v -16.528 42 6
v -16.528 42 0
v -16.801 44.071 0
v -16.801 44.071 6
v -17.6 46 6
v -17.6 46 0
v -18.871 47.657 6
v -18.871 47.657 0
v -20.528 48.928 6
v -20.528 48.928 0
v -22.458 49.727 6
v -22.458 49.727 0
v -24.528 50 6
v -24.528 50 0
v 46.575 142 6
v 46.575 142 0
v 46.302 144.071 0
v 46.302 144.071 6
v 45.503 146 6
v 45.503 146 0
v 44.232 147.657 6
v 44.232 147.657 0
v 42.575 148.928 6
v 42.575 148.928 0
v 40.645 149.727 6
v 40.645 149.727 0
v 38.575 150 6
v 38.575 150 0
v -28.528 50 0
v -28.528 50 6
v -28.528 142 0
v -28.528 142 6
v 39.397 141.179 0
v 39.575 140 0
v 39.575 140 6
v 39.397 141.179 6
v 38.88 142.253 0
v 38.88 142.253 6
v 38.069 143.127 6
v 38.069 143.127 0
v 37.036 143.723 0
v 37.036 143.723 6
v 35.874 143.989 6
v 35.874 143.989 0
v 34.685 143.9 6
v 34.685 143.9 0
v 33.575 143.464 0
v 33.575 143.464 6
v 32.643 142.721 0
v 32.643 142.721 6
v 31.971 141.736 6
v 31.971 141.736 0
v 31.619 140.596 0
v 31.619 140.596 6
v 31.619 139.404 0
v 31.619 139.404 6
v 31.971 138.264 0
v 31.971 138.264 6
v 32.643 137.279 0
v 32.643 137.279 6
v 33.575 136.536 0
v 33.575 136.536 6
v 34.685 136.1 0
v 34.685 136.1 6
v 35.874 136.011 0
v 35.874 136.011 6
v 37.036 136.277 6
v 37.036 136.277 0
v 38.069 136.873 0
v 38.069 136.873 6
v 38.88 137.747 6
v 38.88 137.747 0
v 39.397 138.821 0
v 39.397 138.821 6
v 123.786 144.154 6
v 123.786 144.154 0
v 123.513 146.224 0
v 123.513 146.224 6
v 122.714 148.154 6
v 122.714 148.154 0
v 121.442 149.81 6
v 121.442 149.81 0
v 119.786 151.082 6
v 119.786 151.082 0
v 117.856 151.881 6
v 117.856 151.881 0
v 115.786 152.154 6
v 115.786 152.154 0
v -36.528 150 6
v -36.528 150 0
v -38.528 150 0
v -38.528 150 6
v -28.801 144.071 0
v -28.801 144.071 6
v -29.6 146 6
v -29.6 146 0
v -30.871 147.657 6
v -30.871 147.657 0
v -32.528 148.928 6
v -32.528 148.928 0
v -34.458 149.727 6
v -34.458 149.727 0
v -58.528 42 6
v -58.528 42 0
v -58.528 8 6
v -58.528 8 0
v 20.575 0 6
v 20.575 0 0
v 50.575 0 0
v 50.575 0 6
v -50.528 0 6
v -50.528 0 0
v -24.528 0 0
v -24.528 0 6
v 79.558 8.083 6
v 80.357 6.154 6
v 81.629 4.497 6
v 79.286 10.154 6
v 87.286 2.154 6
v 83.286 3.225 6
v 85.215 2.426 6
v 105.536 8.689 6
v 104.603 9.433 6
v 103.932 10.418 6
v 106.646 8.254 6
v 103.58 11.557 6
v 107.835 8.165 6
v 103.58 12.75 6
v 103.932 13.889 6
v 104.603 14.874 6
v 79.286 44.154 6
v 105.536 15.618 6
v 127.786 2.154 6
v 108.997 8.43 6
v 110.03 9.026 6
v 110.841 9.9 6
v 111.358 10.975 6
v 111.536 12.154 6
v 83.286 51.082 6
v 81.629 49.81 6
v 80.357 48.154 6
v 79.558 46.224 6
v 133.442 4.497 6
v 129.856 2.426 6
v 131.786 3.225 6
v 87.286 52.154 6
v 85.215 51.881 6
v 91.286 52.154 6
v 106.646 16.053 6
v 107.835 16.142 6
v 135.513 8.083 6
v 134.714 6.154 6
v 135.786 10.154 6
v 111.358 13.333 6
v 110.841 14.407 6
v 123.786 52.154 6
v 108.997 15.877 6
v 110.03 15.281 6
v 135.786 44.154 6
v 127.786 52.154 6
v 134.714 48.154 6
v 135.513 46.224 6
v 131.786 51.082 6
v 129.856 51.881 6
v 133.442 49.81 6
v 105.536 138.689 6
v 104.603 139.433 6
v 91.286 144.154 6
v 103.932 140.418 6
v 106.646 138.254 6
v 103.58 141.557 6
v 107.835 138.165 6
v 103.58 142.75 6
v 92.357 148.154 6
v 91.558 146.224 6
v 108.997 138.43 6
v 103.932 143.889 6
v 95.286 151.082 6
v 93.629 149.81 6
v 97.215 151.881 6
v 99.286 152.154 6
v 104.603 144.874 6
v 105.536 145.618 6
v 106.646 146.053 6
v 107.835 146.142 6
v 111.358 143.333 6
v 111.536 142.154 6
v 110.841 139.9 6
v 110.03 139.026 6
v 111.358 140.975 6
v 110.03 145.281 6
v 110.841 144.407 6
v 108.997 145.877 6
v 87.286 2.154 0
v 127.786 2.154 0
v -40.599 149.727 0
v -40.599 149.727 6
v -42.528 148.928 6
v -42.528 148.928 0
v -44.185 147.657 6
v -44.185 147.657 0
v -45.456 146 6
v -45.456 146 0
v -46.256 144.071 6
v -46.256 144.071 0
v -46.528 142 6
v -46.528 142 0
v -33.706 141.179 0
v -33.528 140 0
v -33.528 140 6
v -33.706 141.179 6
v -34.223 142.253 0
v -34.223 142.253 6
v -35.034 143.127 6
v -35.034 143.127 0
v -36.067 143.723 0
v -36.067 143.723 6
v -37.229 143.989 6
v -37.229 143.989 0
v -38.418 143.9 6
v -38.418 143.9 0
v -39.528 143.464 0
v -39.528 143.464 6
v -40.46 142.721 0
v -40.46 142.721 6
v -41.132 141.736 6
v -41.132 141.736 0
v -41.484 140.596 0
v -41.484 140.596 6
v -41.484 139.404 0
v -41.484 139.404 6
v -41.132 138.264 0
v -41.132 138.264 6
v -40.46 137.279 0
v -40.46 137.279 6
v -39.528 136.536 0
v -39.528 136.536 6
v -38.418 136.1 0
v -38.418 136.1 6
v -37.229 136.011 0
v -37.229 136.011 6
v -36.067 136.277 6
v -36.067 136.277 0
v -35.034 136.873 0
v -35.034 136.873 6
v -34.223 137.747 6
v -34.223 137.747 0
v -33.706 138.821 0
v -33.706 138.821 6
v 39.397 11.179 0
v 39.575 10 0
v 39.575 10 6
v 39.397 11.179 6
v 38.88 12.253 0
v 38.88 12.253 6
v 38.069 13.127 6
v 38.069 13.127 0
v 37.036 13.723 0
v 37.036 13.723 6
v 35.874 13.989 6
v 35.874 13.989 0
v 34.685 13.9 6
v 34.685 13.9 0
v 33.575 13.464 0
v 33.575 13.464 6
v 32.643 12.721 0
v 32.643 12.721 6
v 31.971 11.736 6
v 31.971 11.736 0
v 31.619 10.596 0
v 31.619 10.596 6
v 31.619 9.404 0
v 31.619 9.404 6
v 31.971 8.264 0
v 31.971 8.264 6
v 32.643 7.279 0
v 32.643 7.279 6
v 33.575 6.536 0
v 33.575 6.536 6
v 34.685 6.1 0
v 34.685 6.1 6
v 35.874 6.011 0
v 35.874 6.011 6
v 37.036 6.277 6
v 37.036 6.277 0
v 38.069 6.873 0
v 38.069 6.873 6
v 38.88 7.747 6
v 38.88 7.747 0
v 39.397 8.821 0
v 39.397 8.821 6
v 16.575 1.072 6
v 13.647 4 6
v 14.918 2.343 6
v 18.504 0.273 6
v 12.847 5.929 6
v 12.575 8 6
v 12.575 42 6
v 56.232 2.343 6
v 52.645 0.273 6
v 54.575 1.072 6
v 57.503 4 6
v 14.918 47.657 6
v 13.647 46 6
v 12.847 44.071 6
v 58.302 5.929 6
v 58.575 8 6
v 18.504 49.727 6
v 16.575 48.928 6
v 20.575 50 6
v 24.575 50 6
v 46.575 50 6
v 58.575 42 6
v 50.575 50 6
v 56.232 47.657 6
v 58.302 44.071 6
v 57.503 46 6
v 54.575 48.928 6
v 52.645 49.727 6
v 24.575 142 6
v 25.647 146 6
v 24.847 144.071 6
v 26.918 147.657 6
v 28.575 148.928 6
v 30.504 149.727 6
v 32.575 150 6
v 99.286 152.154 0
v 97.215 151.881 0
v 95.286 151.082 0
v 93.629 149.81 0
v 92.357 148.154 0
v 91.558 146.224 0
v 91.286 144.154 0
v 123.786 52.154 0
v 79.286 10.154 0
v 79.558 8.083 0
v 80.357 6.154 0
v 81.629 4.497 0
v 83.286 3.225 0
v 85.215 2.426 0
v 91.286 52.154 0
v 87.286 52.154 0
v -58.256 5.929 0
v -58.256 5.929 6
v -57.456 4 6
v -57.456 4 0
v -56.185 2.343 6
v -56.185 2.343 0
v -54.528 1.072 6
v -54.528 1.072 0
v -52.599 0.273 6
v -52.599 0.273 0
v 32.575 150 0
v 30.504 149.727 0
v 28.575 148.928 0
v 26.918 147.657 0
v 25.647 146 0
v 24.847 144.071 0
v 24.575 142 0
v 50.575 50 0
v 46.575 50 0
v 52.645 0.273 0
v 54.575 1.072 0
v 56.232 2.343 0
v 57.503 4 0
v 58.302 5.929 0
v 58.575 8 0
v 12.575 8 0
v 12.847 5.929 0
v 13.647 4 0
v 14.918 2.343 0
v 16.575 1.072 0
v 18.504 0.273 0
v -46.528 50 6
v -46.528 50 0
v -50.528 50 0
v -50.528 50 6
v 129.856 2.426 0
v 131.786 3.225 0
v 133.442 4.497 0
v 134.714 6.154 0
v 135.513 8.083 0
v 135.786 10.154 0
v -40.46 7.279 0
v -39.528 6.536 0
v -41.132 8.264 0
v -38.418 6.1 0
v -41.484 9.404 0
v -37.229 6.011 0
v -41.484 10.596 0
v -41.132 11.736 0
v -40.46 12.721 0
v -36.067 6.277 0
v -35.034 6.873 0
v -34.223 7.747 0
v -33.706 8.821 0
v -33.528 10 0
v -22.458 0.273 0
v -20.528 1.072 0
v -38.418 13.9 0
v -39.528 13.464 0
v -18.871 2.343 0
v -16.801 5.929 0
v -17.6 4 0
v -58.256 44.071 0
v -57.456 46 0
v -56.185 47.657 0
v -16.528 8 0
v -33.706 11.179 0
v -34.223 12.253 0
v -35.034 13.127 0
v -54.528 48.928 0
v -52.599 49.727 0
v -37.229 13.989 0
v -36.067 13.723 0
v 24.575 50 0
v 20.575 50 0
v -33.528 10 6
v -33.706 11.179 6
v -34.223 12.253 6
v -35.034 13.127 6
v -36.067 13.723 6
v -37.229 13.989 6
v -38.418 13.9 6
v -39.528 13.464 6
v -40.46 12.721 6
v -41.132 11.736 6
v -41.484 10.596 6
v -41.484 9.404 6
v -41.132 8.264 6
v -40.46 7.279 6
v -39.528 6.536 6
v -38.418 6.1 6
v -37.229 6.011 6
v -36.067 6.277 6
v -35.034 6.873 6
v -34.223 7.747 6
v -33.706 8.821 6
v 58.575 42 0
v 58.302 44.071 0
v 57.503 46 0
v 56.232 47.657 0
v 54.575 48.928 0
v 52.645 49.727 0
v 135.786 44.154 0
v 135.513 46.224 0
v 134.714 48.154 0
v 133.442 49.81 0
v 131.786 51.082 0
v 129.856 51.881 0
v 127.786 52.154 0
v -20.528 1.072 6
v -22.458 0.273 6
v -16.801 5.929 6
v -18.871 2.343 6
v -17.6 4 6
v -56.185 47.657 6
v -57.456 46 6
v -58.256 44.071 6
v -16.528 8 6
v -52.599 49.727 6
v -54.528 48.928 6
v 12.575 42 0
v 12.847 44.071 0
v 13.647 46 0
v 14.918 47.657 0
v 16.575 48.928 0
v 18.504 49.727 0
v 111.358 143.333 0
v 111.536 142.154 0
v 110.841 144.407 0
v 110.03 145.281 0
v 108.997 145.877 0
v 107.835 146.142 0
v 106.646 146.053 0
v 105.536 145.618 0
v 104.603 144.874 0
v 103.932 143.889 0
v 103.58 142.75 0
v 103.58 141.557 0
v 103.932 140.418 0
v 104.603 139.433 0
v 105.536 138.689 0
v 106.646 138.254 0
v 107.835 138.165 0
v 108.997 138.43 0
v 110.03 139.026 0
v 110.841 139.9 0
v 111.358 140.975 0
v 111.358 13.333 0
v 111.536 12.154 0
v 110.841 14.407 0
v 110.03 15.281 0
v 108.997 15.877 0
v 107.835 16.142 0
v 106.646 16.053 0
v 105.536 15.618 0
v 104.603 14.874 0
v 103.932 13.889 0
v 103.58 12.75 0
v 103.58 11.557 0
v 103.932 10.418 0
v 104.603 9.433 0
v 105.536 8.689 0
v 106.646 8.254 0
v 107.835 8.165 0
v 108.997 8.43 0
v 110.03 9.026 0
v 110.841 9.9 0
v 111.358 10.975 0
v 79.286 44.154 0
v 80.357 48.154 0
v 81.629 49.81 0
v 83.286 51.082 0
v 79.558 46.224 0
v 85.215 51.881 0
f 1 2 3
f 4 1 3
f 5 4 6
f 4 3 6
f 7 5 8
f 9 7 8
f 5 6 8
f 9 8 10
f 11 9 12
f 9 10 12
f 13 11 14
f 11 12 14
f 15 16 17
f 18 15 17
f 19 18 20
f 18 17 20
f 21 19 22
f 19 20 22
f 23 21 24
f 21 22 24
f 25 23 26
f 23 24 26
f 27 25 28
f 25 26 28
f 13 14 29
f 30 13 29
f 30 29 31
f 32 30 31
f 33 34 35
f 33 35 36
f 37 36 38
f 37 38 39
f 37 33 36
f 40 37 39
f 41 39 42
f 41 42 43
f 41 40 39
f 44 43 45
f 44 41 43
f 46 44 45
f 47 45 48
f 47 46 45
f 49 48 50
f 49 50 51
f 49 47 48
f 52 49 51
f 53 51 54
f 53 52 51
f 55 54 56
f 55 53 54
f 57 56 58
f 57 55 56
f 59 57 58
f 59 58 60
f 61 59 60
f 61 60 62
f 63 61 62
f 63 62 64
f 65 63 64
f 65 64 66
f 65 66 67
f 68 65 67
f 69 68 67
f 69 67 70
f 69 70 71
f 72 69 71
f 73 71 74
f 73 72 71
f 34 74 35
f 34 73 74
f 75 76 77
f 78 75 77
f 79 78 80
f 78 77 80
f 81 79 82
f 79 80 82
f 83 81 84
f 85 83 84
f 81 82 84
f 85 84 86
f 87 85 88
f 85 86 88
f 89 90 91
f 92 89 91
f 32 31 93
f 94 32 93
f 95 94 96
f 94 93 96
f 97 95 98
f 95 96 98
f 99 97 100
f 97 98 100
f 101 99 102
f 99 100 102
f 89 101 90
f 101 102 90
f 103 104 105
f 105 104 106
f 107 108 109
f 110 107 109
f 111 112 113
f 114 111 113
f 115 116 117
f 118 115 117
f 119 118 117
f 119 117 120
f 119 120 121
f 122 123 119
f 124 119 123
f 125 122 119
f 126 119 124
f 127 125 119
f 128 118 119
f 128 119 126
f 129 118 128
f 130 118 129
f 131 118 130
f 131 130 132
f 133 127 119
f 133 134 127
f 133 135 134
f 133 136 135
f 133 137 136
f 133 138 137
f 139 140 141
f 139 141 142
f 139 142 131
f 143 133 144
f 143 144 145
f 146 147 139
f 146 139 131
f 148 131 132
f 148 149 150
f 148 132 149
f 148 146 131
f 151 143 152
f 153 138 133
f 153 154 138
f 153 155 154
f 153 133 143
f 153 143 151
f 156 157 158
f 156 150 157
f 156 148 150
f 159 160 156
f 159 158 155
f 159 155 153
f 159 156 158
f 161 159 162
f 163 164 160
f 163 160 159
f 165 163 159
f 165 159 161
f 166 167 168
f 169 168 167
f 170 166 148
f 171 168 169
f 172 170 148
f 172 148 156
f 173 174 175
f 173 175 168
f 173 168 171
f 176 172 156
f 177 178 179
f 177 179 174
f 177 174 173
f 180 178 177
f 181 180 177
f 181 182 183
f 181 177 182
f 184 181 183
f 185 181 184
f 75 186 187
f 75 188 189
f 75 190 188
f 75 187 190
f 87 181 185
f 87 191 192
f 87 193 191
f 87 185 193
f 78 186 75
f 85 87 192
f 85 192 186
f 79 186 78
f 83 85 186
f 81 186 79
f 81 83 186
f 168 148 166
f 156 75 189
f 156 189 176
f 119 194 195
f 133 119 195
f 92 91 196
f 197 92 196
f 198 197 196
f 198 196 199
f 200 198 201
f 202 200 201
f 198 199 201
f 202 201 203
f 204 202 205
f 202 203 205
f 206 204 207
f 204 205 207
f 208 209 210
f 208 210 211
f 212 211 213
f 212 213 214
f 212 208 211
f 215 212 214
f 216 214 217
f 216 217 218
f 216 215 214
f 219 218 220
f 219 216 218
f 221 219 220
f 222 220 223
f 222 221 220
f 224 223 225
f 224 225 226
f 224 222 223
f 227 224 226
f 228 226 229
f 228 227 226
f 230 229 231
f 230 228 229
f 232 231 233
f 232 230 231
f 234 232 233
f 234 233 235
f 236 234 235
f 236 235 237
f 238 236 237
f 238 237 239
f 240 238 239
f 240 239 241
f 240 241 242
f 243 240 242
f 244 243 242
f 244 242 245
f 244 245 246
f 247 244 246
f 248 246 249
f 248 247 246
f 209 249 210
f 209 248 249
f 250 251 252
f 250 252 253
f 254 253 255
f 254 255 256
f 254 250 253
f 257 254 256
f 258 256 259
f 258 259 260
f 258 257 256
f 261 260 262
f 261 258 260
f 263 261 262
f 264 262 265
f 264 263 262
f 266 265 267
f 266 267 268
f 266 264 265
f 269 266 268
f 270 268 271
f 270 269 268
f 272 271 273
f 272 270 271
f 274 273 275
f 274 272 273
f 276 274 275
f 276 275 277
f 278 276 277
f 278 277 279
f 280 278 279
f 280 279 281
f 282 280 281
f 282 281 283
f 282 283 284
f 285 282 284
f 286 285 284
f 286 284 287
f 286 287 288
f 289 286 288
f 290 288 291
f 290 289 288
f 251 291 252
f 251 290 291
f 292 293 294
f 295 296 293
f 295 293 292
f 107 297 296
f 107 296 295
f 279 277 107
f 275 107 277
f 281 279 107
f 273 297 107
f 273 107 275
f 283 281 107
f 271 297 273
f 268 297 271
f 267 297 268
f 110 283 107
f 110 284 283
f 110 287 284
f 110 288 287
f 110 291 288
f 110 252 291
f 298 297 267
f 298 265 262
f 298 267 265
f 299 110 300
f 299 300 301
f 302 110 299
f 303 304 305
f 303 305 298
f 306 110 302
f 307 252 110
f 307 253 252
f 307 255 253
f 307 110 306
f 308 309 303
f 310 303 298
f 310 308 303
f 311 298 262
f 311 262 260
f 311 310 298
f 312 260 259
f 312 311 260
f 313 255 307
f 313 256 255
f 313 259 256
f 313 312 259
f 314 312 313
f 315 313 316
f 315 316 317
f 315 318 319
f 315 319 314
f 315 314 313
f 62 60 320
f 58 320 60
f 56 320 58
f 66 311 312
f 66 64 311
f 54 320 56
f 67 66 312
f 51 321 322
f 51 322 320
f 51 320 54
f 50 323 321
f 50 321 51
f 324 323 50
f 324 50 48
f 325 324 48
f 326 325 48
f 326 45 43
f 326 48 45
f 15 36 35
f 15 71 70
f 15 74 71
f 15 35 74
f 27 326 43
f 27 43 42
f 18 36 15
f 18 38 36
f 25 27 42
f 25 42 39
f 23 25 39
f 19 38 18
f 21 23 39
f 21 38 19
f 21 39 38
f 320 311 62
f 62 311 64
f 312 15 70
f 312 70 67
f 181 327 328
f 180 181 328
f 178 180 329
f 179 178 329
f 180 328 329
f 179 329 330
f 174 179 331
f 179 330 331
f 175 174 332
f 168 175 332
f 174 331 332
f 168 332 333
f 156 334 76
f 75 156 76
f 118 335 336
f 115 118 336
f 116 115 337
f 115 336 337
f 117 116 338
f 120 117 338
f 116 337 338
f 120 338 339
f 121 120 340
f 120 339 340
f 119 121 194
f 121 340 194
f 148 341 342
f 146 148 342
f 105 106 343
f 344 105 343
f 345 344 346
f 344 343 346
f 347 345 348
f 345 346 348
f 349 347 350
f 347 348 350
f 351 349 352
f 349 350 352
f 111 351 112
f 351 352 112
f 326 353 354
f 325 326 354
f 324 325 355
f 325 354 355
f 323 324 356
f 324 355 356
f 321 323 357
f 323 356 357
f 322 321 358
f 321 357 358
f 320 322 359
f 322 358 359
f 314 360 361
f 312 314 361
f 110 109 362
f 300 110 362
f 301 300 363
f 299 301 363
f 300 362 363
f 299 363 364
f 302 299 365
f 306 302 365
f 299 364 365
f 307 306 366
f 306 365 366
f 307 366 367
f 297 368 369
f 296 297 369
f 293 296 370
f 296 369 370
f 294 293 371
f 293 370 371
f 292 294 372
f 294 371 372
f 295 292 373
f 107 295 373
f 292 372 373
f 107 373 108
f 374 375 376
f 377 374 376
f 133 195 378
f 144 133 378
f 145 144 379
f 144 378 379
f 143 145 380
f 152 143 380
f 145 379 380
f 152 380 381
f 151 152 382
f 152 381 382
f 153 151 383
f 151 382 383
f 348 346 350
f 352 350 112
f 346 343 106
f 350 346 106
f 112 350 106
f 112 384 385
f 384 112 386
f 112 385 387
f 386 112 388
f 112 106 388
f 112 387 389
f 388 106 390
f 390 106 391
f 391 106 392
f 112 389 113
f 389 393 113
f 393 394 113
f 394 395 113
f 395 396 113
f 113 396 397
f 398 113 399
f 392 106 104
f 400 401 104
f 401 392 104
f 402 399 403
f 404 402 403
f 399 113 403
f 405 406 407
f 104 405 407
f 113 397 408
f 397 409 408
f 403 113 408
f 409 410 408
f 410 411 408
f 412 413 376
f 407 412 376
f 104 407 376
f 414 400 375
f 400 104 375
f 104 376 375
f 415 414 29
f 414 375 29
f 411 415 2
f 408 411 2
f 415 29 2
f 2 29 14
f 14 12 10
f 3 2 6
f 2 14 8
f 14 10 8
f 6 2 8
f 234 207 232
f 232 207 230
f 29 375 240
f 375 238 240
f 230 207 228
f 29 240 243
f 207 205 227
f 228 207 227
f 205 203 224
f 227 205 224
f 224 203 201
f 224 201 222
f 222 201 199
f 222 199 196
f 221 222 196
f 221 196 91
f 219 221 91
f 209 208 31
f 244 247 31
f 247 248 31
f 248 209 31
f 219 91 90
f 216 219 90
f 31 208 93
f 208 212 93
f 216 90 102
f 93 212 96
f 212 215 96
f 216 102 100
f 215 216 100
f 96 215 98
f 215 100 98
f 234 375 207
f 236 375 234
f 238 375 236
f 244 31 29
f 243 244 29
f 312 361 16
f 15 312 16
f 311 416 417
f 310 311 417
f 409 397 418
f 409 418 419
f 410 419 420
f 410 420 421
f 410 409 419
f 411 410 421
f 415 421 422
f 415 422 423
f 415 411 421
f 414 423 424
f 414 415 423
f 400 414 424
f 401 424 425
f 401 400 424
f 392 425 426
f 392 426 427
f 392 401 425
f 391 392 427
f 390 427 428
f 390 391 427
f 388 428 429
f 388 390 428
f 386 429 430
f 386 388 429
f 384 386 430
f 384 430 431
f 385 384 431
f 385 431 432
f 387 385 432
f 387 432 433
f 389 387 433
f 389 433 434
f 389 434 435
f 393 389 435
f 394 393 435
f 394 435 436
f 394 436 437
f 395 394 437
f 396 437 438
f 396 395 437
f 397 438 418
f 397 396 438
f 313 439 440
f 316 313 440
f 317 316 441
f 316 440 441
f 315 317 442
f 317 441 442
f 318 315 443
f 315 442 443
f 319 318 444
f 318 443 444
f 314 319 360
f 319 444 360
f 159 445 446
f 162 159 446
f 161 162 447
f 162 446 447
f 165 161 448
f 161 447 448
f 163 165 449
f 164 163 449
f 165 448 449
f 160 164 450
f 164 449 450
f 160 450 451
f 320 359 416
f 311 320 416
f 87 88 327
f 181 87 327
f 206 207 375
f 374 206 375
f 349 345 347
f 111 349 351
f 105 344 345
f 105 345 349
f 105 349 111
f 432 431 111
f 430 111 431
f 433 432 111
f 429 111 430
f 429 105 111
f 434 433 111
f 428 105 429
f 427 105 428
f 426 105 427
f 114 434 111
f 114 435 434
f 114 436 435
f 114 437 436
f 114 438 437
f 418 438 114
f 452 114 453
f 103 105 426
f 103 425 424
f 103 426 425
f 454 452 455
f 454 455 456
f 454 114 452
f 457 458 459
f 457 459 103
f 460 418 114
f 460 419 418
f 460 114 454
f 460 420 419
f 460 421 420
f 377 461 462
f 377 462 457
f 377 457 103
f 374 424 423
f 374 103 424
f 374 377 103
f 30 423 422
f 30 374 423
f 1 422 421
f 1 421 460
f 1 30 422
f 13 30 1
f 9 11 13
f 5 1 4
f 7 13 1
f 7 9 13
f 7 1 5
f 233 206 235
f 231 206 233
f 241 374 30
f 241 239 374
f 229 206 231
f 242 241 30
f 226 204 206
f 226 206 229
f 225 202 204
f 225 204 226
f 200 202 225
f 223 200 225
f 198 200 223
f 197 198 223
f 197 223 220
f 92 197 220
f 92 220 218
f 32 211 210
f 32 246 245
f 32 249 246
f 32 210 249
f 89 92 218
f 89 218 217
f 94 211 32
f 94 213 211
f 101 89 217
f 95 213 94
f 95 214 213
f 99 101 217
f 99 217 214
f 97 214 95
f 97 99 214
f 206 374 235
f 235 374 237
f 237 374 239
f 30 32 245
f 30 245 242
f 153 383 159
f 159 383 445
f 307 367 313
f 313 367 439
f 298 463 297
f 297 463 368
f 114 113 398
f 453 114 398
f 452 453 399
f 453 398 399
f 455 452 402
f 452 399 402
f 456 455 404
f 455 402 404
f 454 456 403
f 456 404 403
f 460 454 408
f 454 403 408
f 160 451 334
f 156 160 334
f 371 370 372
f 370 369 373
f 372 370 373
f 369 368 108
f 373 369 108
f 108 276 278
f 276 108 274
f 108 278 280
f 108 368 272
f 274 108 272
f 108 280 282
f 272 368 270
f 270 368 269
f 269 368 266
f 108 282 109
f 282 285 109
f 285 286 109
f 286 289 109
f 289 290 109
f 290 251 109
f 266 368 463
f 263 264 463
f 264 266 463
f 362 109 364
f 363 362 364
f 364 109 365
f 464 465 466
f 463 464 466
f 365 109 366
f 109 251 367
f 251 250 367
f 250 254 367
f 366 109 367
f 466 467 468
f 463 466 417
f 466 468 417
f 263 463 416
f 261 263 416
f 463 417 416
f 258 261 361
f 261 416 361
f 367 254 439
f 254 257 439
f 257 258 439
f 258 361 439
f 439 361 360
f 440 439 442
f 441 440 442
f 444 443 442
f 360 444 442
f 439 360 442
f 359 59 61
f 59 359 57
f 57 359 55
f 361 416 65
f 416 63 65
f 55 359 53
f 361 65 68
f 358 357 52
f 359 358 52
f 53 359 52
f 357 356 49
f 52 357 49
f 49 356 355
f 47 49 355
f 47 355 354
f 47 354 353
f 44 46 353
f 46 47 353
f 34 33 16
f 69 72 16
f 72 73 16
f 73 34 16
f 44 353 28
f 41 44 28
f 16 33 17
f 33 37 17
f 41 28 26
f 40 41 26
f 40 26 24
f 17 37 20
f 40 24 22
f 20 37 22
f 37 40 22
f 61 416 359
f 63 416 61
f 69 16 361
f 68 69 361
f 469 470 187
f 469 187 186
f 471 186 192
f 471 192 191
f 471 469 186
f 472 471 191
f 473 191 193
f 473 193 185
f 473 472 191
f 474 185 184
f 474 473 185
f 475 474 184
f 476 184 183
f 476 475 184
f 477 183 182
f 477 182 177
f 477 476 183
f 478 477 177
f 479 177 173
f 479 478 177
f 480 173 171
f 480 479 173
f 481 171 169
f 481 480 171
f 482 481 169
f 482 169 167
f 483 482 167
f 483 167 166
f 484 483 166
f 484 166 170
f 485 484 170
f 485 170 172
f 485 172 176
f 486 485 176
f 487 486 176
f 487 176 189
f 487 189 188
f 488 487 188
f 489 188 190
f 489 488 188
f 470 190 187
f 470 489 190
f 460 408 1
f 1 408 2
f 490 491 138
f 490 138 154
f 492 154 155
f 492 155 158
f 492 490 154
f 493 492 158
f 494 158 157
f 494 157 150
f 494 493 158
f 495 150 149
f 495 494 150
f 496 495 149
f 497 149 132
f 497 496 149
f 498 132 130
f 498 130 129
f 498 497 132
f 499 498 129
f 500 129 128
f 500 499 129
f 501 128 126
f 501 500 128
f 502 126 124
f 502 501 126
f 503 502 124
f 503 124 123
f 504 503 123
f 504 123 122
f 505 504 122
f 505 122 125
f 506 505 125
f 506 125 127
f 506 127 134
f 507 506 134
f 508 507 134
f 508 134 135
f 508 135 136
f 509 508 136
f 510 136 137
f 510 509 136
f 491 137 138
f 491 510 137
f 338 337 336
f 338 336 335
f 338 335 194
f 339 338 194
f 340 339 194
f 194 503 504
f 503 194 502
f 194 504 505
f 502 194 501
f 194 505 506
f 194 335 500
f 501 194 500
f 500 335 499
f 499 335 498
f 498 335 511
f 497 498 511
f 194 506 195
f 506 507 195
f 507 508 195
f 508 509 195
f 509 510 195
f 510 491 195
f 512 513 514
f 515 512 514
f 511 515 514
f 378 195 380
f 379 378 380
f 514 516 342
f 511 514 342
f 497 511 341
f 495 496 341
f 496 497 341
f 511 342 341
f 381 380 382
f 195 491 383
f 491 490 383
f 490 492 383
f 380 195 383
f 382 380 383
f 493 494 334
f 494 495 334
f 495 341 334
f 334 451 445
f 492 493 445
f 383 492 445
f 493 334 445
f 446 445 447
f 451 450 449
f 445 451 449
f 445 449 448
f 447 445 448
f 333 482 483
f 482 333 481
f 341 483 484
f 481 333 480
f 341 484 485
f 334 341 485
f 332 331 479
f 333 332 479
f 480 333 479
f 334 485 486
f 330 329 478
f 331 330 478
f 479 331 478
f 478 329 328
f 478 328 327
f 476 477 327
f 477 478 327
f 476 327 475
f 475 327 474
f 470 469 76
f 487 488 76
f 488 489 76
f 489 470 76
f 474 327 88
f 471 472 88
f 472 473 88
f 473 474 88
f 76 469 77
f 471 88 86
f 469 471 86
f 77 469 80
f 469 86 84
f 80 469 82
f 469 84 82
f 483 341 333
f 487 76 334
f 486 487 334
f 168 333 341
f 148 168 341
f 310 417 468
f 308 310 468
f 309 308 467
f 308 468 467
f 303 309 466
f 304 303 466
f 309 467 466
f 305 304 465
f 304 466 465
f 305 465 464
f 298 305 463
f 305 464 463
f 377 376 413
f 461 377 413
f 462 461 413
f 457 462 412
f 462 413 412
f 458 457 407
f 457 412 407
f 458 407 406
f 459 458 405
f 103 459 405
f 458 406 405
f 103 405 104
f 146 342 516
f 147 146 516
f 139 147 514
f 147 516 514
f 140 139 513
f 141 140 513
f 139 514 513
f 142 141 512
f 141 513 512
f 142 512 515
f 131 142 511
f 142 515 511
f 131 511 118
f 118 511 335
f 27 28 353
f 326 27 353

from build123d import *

# Parameters (mm, degrees)
F0_R     = 4
F1_DEPTH = 6
F2_R     = 4
F3_DEPTH = 6
F4_R     = 4
F5_DEPTH = 6


with BuildPart() as f1:
    # F0 (on Top) → F1 (new body)
    with BuildSketch(Plane.XY):
        with BuildLine():
            Line((-36.528265, 150), (-38.528265, 150))
            ThreePointArc((-38.528265, 150), (-44.18512, 147.656854), (-46.528265, 142))
            Line((-46.528265, 142), (-46.528265, 50))
            Line((-46.528265, 50), (-50.528265, 50))
            ThreePointArc((-50.528265, 50), (-56.18512, 47.656854), (-58.528265, 42))
            Line((-58.528265, 42), (-58.528265, 8))
            ThreePointArc((-58.528265, 8), (-56.18512, 2.343146), (-50.528265, 0))
            Line((-50.528265, 0), (-24.528265, 0))
            ThreePointArc((-24.528265, 0), (-18.871411, 2.343146), (-16.528265, 8))
            Line((-16.528265, 8), (-16.528265, 42))
            ThreePointArc((-16.528265, 42), (-18.871411, 47.656854), (-24.528265, 50))
            Line((-24.528265, 50), (-28.528265, 50))
            Line((-28.528265, 50), (-28.528265, 142))
            ThreePointArc((-28.528265, 142), (-30.871411, 147.656854), (-36.528265, 150))
        make_face()
        with Locations((-37.528265, 10)):
            Circle(F0_R, mode=Mode.SUBTRACT)
        with Locations((-37.528265, 140)):
            Circle(F0_R, mode=Mode.SUBTRACT)
    extrude(amount=F1_DEPTH)


with BuildPart() as f3:
    # F2 (on Top) → F3 (new body)
    with BuildSketch(Plane.XY):
        with BuildLine():
            Line((38.574718, 150), (32.574718, 150))
            ThreePointArc((32.574718, 150), (26.917864, 147.656854), (24.574718, 142))
            Line((24.574718, 142), (24.574718, 50))
            Line((24.574718, 50), (20.574718, 50))
            ThreePointArc((20.574718, 50), (14.917864, 47.656854), (12.574718, 42))
            Line((12.574718, 42), (12.574718, 8))
            ThreePointArc((12.574718, 8), (14.917864, 2.343146), (20.574718, 0))
            Line((20.574718, 0), (50.574718, 0))
            ThreePointArc((50.574718, 0), (56.231572, 2.343146), (58.574718, 8))
            Line((58.574718, 8), (58.574718, 42))
            ThreePointArc((58.574718, 42), (56.231572, 47.656854), (50.574718, 50))
            Line((50.574718, 50), (46.574718, 50))
            Line((46.574718, 50), (46.574718, 142))
            ThreePointArc((46.574718, 142), (44.231572, 147.656854), (38.574718, 150))
        make_face()
        with Locations((35.574718, 10)):
            Circle(F2_R, mode=Mode.SUBTRACT)
        with Locations((35.574718, 140)):
            Circle(F2_R, mode=Mode.SUBTRACT)
    extrude(amount=F3_DEPTH)


with BuildPart() as f5:
    # F4 (on Top) → F5 (new body)
    with BuildSketch(Plane.XY):
        with BuildLine():
            Line((115.785624, 152.153529), (99.285624, 152.153529))
            ThreePointArc((99.285624, 152.153529), (93.628769, 149.810384), (91.285624, 144.153529))
            Line((91.285624, 144.153529), (91.285624, 52.153529))
            Line((91.285624, 52.153529), (87.285624, 52.153529))
            ThreePointArc((87.285624, 52.153529), (81.628769, 49.810384), (79.285624, 44.153529))
            Line((79.285624, 44.153529), (79.285624, 10.153529))
            ThreePointArc((79.285624, 10.153529), (81.628769, 4.496675), (87.285624, 2.153529))
            Line((87.285624, 2.153529), (127.785624, 2.153529))
            ThreePointArc((127.785624, 2.153529), (133.442478, 4.496675), (135.785624, 10.153529))
            Line((135.785624, 10.153529), (135.785624, 44.153529))
            ThreePointArc((135.785624, 44.153529), (133.442478, 49.810384), (127.785624, 52.153529))
            Line((127.785624, 52.153529), (123.785624, 52.153529))
            Line((123.785624, 52.153529), (123.785624, 144.153529))
            ThreePointArc((123.785624, 144.153529), (121.442478, 149.810384), (115.785624, 152.153529))
        make_face()
        with Locations((107.535624, 12.153529)):
            Circle(F4_R, mode=Mode.SUBTRACT)
        with Locations((107.535624, 142.153529)):
            Circle(F4_R, mode=Mode.SUBTRACT)
    extrude(amount=F5_DEPTH)


solid = Compound([f1.part, f3.part, f5.part])
